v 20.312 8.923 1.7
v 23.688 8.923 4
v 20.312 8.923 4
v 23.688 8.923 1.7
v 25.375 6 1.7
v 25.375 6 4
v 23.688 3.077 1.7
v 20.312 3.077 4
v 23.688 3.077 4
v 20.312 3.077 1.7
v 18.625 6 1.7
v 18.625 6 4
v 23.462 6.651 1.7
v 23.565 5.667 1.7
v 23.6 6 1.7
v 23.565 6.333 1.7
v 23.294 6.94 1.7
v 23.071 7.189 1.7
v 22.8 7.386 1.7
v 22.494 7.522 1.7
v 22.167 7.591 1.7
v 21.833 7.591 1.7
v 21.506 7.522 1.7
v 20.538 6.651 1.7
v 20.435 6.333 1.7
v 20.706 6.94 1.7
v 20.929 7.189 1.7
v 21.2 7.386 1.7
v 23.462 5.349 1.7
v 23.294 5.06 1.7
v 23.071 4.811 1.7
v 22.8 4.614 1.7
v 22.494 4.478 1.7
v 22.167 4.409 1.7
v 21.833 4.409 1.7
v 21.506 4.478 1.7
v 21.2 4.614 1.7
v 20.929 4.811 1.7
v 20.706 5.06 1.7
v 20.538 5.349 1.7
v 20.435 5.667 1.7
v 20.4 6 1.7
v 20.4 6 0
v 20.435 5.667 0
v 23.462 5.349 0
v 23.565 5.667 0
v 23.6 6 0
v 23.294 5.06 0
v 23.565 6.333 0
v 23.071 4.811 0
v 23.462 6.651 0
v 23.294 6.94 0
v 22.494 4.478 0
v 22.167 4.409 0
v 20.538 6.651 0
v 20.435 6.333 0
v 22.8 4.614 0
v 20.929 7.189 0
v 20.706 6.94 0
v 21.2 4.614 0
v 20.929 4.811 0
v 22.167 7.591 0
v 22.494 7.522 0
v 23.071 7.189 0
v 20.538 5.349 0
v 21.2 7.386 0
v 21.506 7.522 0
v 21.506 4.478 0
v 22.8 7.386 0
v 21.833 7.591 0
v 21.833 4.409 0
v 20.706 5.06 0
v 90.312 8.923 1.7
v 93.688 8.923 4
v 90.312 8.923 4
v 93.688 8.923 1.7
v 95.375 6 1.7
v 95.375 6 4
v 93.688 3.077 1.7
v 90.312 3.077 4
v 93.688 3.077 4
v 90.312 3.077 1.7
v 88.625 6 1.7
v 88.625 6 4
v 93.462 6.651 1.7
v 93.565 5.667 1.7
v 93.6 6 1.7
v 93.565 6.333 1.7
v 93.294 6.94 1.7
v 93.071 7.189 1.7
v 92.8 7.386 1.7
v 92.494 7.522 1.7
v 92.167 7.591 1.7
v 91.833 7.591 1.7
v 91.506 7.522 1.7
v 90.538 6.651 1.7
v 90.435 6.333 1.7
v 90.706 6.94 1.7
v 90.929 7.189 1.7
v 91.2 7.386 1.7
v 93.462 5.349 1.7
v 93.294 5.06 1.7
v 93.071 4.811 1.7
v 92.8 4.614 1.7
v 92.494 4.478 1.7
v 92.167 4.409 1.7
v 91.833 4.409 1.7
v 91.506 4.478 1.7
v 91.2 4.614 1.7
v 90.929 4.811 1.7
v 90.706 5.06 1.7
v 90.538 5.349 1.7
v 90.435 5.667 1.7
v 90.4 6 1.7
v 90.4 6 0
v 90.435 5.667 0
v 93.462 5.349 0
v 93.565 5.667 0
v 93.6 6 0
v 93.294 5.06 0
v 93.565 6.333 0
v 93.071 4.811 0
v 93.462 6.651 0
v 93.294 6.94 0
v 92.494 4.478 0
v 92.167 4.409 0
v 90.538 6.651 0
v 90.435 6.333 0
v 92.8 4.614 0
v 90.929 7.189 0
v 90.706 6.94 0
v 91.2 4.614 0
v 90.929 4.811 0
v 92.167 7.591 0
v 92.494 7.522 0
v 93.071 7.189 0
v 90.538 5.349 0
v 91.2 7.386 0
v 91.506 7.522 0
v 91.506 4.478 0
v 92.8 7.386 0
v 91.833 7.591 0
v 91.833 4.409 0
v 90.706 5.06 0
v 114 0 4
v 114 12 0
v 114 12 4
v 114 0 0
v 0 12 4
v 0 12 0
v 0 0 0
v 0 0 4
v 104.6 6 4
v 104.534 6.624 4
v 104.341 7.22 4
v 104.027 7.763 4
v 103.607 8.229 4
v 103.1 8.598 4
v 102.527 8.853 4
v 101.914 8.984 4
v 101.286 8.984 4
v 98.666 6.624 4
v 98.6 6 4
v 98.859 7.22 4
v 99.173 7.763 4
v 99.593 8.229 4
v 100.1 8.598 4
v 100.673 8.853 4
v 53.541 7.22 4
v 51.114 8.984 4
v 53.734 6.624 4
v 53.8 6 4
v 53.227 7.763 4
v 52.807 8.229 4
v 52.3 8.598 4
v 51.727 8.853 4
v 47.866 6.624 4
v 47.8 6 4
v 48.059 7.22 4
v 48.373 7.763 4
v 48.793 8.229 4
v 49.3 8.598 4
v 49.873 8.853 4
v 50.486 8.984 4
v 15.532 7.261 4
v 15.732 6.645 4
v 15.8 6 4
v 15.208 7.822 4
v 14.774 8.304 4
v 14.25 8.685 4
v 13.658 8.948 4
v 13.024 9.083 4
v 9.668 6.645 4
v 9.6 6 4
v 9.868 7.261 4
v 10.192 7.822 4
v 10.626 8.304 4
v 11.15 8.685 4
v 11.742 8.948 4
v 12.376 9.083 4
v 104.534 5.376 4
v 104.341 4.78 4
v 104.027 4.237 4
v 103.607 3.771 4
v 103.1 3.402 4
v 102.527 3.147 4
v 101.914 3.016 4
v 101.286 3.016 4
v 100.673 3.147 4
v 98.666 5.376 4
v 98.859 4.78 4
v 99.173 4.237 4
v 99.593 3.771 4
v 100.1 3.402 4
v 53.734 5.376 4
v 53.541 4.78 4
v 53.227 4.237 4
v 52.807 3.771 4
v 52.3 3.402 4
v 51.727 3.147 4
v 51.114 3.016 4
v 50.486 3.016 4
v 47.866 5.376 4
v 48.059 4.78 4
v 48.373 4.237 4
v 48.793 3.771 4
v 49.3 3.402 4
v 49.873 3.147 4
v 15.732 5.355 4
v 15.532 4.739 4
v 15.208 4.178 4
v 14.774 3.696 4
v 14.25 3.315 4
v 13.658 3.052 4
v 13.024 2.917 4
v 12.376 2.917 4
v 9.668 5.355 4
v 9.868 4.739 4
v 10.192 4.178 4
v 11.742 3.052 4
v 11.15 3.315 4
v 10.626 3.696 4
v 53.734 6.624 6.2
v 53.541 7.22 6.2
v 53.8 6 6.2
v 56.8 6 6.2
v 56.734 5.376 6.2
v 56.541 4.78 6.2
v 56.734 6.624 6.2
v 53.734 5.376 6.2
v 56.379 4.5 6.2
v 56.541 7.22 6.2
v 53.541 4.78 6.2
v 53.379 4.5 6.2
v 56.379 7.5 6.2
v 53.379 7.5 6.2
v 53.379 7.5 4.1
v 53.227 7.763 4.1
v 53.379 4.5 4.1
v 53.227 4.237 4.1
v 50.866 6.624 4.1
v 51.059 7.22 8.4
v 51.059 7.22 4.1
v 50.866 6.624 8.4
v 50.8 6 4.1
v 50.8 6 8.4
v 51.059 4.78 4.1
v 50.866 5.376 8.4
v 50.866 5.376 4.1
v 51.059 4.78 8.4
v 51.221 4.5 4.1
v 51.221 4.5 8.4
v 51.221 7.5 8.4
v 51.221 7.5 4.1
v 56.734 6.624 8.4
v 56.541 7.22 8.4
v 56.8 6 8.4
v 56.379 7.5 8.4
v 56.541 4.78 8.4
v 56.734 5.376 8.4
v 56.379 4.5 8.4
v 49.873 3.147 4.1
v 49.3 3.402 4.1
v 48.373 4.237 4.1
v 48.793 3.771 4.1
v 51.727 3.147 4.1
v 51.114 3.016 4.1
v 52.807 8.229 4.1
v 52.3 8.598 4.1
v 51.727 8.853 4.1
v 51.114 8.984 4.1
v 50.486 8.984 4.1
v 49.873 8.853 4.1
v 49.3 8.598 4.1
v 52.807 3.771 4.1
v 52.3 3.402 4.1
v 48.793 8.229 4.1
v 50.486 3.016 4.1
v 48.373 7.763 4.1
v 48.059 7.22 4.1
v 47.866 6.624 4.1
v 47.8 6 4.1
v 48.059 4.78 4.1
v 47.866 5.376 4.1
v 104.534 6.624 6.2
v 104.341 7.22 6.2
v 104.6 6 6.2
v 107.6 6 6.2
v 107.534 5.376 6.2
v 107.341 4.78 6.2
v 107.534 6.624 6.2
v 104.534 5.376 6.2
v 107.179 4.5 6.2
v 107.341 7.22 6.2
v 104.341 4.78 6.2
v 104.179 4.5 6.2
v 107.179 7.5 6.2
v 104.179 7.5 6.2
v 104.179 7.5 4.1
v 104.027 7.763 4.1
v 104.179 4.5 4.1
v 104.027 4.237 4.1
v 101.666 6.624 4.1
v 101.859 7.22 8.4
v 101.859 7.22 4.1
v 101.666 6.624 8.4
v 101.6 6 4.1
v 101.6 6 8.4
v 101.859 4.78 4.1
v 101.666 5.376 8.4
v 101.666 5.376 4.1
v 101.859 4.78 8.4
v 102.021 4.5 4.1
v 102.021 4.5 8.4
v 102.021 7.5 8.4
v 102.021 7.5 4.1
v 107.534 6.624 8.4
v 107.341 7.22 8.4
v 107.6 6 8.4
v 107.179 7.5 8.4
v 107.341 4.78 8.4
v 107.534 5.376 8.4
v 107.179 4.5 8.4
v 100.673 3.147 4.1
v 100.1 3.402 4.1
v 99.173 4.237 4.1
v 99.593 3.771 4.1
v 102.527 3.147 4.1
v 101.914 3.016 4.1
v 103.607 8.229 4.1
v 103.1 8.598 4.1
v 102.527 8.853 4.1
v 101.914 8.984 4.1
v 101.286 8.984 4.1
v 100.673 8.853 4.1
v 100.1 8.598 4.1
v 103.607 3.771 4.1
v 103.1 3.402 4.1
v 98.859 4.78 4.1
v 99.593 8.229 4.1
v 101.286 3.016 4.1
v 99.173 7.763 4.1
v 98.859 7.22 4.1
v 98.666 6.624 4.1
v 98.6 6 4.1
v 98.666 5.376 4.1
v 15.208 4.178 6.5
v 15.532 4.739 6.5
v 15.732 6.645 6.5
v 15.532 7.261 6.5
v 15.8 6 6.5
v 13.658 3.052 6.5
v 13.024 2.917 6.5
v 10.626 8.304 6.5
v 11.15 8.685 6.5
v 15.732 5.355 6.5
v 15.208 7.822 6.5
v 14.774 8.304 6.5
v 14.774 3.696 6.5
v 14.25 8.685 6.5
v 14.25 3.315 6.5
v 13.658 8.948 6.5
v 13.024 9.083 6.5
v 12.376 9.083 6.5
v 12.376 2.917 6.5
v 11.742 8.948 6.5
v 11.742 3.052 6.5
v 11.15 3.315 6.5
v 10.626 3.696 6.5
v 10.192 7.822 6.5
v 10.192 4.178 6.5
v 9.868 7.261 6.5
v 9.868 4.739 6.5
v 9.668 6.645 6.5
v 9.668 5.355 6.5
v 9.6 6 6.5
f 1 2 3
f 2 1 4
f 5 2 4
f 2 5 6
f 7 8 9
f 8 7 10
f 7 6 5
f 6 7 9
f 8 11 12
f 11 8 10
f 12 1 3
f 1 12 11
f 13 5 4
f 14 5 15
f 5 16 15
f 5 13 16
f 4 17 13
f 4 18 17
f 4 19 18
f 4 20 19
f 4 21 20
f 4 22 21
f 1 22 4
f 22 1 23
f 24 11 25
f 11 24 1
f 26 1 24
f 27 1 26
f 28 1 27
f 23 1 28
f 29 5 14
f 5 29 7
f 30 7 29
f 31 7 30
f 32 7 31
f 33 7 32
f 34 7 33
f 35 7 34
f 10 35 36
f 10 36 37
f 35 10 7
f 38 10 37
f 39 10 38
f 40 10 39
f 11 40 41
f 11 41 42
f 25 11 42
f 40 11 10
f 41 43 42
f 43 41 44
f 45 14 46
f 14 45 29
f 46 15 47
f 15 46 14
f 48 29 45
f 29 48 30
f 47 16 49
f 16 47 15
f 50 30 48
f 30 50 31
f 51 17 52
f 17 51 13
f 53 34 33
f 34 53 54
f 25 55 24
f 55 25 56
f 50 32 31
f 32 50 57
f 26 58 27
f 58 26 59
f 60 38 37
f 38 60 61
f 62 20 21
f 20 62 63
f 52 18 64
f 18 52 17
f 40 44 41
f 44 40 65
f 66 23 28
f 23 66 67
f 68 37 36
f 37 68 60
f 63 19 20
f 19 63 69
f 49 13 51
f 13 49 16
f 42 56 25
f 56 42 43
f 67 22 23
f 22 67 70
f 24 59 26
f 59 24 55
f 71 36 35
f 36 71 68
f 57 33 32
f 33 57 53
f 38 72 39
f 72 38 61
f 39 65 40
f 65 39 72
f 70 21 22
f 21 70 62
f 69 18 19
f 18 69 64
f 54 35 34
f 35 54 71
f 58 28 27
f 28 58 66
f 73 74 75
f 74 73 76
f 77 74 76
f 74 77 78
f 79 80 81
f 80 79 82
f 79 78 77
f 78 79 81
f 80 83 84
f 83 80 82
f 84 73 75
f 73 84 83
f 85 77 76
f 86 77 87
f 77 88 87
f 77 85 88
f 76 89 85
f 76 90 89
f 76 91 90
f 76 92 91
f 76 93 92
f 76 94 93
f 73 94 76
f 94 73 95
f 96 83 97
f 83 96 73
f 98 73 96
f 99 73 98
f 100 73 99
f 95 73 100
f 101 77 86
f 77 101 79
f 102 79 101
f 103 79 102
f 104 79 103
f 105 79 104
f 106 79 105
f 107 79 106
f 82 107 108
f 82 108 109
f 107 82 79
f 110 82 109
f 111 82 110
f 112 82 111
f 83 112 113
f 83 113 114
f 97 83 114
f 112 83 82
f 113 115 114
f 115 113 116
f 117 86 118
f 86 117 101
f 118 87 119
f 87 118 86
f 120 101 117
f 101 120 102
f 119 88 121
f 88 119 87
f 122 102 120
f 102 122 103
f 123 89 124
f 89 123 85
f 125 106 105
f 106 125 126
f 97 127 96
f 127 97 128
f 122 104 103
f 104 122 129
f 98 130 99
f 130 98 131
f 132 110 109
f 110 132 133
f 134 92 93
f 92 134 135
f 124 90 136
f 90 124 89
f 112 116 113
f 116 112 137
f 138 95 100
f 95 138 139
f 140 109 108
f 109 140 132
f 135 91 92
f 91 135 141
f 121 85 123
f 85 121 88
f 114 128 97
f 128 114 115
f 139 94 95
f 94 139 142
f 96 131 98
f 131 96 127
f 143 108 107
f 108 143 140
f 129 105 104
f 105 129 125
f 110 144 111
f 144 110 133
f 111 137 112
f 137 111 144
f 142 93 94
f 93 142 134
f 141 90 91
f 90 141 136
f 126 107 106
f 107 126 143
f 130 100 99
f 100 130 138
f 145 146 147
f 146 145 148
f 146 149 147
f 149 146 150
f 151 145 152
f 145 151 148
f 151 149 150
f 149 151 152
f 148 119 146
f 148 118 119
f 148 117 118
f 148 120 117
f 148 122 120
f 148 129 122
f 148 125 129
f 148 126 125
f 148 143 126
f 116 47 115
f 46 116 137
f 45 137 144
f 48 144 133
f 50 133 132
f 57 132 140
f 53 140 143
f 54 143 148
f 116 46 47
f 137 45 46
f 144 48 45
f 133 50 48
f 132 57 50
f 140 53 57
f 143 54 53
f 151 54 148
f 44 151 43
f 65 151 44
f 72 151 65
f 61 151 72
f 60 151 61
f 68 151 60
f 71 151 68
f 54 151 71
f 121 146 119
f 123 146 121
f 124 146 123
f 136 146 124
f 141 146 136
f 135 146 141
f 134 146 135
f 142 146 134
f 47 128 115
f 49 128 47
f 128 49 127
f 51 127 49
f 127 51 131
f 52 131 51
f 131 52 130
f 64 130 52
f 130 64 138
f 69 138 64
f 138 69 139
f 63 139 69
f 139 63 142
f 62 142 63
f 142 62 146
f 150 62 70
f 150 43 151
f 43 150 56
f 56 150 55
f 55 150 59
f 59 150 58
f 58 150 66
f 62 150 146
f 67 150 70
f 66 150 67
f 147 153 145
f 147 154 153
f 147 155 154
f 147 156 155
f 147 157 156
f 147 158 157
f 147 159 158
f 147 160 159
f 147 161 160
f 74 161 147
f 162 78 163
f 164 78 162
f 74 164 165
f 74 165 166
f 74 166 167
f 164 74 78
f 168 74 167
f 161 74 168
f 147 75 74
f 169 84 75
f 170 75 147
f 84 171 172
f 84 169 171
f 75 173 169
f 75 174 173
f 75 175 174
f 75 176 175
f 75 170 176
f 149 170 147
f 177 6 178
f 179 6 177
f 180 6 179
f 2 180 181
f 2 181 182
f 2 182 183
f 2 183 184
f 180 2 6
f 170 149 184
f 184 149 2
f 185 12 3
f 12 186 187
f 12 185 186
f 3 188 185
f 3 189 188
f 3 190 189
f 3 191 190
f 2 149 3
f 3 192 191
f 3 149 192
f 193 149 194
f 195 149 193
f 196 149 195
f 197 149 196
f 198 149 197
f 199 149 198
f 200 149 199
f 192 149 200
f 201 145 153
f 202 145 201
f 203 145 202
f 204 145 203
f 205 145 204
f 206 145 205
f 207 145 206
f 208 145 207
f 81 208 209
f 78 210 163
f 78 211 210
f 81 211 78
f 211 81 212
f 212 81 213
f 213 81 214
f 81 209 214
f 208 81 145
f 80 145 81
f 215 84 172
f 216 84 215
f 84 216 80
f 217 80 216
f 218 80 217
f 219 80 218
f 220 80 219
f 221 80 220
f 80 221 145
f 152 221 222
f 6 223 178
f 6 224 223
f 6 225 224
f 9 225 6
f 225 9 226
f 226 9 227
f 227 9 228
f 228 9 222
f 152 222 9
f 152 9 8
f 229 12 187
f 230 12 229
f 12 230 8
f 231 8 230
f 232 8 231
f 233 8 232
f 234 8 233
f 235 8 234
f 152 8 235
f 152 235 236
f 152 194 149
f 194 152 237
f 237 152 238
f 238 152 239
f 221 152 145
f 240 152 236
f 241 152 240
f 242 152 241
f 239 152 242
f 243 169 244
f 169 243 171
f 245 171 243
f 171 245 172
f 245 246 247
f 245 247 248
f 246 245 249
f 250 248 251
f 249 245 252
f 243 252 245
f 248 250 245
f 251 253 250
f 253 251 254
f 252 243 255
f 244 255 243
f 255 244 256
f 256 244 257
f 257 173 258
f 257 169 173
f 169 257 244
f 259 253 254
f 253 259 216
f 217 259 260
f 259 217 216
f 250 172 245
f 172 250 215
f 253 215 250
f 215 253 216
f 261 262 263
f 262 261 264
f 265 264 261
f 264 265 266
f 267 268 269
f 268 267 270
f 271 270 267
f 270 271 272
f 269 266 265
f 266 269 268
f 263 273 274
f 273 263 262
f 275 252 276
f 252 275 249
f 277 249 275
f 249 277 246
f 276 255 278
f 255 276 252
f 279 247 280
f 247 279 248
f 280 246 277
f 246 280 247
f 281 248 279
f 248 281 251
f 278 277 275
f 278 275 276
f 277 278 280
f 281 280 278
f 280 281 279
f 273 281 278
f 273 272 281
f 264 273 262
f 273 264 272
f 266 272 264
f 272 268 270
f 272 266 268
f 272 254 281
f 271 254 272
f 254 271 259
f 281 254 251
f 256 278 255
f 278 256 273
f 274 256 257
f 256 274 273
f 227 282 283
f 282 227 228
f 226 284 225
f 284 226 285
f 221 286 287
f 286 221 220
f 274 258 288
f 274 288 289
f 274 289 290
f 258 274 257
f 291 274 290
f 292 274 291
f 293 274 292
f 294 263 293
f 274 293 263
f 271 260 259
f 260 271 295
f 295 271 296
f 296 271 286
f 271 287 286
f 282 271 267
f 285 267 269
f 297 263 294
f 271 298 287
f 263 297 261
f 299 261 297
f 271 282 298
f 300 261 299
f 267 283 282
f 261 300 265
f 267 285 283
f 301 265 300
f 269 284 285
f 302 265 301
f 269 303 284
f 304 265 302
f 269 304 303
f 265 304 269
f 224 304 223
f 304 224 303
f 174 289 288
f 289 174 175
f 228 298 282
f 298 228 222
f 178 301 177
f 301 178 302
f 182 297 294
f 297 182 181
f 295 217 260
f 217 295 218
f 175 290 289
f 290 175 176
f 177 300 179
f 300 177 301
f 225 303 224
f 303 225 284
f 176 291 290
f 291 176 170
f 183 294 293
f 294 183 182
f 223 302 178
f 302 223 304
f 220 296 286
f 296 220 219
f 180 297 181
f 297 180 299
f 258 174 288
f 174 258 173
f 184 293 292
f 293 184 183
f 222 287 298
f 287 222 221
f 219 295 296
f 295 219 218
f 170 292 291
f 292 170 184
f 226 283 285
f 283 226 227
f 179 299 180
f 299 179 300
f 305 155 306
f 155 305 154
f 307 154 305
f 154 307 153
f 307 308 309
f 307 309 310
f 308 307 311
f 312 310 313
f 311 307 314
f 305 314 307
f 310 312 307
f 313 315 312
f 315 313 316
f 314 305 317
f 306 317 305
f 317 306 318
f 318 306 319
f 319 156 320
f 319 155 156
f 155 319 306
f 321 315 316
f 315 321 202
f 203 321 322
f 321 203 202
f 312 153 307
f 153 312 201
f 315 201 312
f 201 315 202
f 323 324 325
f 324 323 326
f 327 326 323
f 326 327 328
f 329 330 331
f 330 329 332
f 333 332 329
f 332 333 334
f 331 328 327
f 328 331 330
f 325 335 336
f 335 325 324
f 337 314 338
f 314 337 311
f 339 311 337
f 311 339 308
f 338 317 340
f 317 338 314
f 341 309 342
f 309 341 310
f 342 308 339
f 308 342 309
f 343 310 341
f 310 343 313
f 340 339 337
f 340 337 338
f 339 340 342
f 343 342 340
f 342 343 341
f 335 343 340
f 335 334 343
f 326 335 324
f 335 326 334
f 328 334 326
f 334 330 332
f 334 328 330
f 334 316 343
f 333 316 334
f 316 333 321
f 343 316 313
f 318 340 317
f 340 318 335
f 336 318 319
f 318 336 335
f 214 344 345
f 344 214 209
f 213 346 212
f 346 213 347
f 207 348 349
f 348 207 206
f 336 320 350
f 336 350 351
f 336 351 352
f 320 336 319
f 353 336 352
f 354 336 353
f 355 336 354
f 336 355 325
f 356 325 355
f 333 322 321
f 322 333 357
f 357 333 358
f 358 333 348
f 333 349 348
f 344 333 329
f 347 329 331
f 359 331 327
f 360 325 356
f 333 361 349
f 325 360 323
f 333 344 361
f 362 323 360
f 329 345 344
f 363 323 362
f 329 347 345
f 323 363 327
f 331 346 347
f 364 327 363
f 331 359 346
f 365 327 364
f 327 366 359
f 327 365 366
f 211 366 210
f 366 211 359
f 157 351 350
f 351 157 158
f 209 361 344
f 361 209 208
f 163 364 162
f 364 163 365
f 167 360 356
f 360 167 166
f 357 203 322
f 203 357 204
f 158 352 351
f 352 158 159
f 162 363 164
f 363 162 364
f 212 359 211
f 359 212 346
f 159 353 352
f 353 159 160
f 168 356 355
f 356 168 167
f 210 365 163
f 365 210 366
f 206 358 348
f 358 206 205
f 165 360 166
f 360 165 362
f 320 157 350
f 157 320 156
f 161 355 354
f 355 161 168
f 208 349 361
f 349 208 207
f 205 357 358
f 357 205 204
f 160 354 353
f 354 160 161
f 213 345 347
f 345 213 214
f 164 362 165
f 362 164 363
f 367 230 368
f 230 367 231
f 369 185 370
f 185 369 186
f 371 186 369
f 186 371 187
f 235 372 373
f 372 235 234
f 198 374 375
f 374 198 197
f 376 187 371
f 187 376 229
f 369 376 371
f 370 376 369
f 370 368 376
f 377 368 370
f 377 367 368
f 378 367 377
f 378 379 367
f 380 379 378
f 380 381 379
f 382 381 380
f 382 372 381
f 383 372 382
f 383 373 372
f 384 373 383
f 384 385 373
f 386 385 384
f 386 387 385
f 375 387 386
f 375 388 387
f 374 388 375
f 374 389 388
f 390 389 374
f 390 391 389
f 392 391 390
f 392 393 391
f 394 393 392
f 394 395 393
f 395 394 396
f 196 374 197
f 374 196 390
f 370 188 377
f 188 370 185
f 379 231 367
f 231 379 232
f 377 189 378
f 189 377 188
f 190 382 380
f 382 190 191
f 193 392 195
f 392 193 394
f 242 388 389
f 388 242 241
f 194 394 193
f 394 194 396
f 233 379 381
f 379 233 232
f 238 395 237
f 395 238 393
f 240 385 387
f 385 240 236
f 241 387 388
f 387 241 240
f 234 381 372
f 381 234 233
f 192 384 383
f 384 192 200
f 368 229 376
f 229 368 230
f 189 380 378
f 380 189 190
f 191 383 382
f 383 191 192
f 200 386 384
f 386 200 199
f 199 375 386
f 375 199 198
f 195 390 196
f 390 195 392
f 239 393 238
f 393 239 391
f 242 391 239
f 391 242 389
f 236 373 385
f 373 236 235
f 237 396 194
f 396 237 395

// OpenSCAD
$fs = 0.1;

module clip() {
	size = 6;
	
	scale([1, 2.2/3, 1]) intersection() {
		translate([0, -size, 0]) linear_extrude(size/2, center=true) polygon(points=[
			[0, 0], [size, 0], 
			[size, size/2], [size/2, size/2],
			[size/2, size], [0, size]
		]);
		
		union() {
			intersection() {
				rotate(90, [1, 0, 0]) cylinder(d=size,h=size/2);
				translate([size/2, 0, 0]) rotate(90, [1, 0, 0])  cylinder(h=size,d=size);
			}
			
			translate([size/2, -size/2, 0]) rotate(90, [1, 0, 0])  cylinder(h=size/2,d=size);
		}
	}
	
	rotate(90, [1, 0, 0]) cylinder(d=size,h=0.1);
}

module hex_hole(nut_radius, screw_radius, depth) {
	correction = 1/cos(30);
	cylinder(r=nut_radius*correction+0.2, h=2.4, $fa=60);
	cylinder(d=screw_radius,h=depth);
}

height = 12;
width = 114;
thickness = 4;
hole_width = 12.7;
distance = 70;
offset = (width-distance) / 2;

translate([0, 0, thickness]) rotate(90, [-1, 0, 0]) union() {
	color("orange") translate([hole_width*1, 0, height/2]) rotate(90, [1, 0, 0]) cylinder(d=6.2,h=2.5);
	
	color("blue") difference() {
		cube(size=[width, thickness, height]);
		
		// Screw holes
		translate([offset, 0, height/2]) rotate(90, [-1, 0, 0]) {
			translate([0, 0, -0.1]) hex_hole(5.5/2, 3.2, thickness+0.2);
			translate([distance, 0, -0.1]) hex_hole(5.5/2, 3.2, thickness+0.2);
		}
	}
	
	color("green") union() {
		translate([hole_width*4, 0, height/2]) clip();
		translate([hole_width*8, 0, height/2]) clip();
	}
}
